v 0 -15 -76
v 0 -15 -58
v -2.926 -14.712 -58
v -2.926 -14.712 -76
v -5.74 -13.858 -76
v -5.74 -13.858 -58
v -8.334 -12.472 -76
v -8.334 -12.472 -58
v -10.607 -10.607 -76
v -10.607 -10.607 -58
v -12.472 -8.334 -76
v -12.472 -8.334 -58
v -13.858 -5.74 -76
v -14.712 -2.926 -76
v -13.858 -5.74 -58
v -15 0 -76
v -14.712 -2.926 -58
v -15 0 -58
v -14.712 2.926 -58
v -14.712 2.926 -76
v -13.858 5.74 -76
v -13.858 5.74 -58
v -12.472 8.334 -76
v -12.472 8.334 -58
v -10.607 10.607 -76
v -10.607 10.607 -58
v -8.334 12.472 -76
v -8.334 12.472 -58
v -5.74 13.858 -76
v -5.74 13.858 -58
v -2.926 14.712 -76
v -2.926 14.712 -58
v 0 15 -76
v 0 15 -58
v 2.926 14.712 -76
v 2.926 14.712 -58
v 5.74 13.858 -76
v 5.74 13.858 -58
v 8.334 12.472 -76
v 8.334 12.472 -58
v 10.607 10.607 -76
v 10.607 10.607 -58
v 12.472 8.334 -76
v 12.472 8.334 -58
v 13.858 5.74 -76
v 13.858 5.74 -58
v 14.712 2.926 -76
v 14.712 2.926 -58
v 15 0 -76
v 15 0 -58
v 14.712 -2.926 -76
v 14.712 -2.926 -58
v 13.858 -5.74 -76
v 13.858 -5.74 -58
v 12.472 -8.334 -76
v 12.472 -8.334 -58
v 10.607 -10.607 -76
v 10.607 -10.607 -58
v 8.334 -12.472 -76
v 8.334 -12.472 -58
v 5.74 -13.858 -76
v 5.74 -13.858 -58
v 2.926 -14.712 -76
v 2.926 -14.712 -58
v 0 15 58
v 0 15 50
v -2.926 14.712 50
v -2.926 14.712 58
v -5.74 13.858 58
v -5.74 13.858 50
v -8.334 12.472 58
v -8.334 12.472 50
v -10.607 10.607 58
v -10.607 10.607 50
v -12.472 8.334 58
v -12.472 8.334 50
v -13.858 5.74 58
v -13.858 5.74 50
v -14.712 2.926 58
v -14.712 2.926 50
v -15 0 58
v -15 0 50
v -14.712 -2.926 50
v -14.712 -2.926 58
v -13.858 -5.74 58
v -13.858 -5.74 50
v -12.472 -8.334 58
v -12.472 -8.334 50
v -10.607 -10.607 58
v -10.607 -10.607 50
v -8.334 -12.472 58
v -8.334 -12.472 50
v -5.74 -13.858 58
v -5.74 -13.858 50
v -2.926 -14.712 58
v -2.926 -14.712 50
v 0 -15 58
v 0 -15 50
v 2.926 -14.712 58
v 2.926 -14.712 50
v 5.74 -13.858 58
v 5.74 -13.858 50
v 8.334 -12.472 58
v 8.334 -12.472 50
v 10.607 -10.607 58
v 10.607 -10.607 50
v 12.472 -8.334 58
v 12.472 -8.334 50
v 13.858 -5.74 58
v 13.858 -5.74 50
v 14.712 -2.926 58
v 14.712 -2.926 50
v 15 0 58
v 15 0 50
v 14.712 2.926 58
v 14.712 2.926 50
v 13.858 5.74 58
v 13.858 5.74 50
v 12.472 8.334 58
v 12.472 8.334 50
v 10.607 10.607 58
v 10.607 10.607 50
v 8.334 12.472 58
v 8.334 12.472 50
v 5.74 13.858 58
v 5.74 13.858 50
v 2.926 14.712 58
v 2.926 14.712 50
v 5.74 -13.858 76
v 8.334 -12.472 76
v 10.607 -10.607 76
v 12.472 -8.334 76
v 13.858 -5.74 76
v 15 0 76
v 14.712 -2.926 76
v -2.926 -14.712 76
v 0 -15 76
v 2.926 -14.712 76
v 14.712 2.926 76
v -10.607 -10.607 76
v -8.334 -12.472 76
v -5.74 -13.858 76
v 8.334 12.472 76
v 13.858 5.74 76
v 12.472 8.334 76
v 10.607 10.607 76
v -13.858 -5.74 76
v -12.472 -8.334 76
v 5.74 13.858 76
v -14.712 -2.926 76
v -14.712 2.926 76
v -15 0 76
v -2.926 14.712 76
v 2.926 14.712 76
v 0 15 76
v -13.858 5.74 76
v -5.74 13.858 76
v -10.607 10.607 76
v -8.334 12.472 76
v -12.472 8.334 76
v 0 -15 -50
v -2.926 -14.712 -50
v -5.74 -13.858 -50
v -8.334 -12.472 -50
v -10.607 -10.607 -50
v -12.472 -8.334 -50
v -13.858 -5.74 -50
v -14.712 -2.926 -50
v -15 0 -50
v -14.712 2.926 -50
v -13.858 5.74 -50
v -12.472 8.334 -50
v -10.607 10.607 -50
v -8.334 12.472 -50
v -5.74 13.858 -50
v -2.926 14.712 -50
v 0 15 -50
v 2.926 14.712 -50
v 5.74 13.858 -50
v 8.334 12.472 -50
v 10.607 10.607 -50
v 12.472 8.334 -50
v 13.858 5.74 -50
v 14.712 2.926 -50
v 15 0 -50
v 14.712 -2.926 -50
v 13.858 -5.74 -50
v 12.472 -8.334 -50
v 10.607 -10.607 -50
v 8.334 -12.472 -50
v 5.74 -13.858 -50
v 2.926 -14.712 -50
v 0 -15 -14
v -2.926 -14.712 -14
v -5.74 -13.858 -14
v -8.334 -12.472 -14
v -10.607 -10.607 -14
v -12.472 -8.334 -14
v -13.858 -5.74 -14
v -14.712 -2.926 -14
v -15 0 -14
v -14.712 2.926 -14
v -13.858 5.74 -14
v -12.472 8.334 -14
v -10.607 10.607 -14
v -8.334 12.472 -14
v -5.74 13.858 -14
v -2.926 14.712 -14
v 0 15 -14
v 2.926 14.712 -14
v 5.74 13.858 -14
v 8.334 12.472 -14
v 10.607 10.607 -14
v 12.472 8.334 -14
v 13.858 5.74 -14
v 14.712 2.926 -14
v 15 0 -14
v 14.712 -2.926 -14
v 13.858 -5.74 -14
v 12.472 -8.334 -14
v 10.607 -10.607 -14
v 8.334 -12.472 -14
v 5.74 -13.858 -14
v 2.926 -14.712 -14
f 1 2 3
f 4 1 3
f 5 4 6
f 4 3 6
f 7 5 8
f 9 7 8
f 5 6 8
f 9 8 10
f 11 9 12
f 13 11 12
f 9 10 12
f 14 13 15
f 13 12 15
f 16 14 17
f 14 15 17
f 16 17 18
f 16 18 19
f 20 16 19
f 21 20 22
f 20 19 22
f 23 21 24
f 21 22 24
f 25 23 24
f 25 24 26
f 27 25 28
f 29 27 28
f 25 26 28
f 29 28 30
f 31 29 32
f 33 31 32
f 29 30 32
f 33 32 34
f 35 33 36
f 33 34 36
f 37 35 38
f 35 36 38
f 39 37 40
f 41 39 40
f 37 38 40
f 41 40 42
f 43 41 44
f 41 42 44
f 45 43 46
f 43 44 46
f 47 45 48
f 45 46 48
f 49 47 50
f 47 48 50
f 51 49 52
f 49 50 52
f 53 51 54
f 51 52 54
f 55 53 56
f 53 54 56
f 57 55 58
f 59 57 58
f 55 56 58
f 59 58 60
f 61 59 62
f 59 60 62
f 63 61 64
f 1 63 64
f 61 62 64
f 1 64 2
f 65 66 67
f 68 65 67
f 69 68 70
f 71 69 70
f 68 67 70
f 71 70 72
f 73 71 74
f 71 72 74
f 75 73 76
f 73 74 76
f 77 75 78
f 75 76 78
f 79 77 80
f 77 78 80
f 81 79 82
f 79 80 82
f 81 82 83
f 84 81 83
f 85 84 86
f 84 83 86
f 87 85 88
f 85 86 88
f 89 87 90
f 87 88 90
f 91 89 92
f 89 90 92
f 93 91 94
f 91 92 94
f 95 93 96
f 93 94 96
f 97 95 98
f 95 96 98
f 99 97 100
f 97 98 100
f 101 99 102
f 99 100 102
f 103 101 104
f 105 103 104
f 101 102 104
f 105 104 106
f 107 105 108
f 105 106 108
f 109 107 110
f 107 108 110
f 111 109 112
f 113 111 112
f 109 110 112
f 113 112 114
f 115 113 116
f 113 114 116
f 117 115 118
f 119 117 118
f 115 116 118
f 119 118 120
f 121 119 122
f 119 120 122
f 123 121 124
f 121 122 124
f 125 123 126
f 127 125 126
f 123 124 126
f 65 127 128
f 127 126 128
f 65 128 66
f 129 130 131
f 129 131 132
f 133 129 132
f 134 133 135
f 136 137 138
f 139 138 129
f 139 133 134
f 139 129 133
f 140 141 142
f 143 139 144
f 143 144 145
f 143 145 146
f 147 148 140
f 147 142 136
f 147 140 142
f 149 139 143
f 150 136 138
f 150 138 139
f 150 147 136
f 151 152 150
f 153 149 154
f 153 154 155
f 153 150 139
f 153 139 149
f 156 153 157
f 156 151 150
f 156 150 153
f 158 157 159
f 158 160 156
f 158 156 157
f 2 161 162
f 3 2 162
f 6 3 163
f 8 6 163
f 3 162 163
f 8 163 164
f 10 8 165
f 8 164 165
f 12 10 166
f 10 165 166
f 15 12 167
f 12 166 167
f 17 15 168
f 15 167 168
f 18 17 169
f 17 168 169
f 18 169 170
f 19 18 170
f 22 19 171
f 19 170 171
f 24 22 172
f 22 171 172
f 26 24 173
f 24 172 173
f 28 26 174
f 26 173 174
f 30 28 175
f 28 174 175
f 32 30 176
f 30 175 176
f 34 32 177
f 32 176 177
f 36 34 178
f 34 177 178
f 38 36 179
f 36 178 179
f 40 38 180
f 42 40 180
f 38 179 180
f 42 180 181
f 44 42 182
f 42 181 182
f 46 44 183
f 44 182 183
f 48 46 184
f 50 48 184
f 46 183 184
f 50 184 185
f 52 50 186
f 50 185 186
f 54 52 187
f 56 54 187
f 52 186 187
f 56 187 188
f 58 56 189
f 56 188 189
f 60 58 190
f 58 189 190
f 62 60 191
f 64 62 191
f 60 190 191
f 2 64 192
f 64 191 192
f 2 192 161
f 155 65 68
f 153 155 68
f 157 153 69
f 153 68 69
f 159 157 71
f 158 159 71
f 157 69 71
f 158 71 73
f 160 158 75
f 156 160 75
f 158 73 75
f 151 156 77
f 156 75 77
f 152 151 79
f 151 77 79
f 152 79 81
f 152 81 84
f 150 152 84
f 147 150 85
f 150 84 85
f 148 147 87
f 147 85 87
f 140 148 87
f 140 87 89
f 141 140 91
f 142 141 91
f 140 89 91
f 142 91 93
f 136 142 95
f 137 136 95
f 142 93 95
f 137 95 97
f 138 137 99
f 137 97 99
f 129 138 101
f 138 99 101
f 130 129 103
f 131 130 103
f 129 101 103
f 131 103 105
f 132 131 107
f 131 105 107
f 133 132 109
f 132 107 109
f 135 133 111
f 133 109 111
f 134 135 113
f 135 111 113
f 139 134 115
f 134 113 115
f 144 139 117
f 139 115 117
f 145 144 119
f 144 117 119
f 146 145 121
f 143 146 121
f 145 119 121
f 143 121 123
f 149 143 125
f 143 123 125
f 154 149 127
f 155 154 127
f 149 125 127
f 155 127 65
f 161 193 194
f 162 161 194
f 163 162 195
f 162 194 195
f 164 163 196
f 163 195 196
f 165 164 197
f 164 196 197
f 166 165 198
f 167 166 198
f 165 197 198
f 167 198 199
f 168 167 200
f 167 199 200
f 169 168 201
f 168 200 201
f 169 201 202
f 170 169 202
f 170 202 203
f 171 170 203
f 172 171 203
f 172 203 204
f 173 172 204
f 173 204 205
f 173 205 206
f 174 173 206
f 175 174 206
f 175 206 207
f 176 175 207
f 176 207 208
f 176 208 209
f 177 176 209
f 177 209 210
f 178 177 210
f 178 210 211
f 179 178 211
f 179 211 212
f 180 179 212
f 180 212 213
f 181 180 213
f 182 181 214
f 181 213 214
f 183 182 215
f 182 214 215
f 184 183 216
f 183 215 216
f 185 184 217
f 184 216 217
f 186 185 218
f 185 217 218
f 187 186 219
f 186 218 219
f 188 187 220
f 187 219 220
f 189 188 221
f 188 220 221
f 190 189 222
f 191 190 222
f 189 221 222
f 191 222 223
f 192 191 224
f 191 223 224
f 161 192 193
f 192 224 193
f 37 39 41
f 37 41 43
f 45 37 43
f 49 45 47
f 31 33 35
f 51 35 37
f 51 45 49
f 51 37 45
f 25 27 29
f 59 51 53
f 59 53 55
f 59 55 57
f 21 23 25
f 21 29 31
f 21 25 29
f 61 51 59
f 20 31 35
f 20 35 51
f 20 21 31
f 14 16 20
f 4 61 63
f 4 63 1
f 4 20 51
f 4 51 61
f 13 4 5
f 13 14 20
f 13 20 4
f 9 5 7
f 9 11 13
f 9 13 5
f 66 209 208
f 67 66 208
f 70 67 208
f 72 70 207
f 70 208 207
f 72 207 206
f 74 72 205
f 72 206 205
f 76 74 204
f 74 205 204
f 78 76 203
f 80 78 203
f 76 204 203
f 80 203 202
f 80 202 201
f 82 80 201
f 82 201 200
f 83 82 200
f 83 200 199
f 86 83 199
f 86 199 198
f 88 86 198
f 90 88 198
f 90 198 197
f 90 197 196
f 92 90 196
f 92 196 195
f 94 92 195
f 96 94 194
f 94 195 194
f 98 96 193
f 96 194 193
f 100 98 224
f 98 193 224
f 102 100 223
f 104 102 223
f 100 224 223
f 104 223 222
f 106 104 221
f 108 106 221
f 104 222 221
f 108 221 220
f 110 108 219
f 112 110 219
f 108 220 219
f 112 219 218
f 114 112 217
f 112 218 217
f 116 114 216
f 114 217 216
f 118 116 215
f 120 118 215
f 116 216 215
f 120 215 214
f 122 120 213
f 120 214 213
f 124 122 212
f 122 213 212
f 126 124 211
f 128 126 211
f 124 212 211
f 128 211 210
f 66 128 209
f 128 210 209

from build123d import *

# Parameters (mm, degrees)
PAD_DEPTH    = 14
PAD001_DEPTH = 36
PAD002_DEPTH = 36
PAD003_DEPTH = 8
PAD004_DEPTH = 8
PAD005_DEPTH = 18
PAD006_DEPTH = 18


with BuildPart() as part:
    # Sketch → Pad (new body, symmetric)
    with BuildSketch(Plane.XY):
        with BuildLine():
            ThreePointArc((0, -15), (15, 0), (0, 15))
            ThreePointArc((0, 15), (-15, 0), (0, -15))
        make_face()
    extrude(amount=PAD_DEPTH, both=True)

    # Pad Face4 → Pad001 (add)
    with BuildSketch(Plane(origin=(0, 0, 14), x_dir=(0, 1, 0), z_dir=(0, 0, 1))):
        with BuildLine():
            ThreePointArc((-15, 0), (0, -15), (15, 0))
            ThreePointArc((15, 0), (0, 15), (-15, 0))
        make_face()
    extrude(amount=PAD001_DEPTH)

    # Pad001 Face3 → Pad002 (add)
    with BuildSketch(Plane(origin=(0, 0, -14), x_dir=(0, -1, 0), z_dir=(0, 0, -1))):
        with BuildLine():
            ThreePointArc((-15, 0), (0, -15), (15, 0))
            ThreePointArc((15, 0), (0, 15), (-15, 0))
        make_face()
    extrude(amount=PAD002_DEPTH)

    # Pad002 Face8 → Pad003 (add)
    with BuildSketch(Plane(origin=(0, 0, 50), x_dir=(0, 1, 0), z_dir=(0, 0, 1))):
        with BuildLine():
            ThreePointArc((-15, 0), (0, -15), (15, 0))
            ThreePointArc((15, 0), (0, 15), (-15, 0))
        make_face()
    extrude(amount=PAD003_DEPTH)

    # Pad003 Face7 → Pad004 (add)
    with BuildSketch(Plane(origin=(0, 0, -50), x_dir=(0, -1, 0), z_dir=(0, 0, -1))):
        with BuildLine():
            ThreePointArc((-15, 0), (0, -15), (15, 0))
            ThreePointArc((15, 0), (0, 15), (-15, 0))
        make_face()
    extrude(amount=PAD004_DEPTH)

    # Pad004 Face11 → Pad005 (add)
    with BuildSketch(Plane(origin=(0, 0, -58), x_dir=(0, -1, 0), z_dir=(0, 0, -1))):
        with BuildLine():
            ThreePointArc((-15, 0), (0, -15), (15, 0))
            ThreePointArc((15, 0), (0, 15), (-15, 0))
        make_face()
    extrude(amount=PAD005_DEPTH)

    # Pad005 Face12 → Pad006 (add)
    with BuildSketch(Plane(origin=(0, 0, 58), x_dir=(0, 1, 0), z_dir=(0, 0, 1))):
        with BuildLine():
            ThreePointArc((-15, 0), (0, -15), (15, 0))
            ThreePointArc((15, 0), (0, 15), (-15, 0))
        make_face()
    extrude(amount=PAD006_DEPTH)


solid = part.part
